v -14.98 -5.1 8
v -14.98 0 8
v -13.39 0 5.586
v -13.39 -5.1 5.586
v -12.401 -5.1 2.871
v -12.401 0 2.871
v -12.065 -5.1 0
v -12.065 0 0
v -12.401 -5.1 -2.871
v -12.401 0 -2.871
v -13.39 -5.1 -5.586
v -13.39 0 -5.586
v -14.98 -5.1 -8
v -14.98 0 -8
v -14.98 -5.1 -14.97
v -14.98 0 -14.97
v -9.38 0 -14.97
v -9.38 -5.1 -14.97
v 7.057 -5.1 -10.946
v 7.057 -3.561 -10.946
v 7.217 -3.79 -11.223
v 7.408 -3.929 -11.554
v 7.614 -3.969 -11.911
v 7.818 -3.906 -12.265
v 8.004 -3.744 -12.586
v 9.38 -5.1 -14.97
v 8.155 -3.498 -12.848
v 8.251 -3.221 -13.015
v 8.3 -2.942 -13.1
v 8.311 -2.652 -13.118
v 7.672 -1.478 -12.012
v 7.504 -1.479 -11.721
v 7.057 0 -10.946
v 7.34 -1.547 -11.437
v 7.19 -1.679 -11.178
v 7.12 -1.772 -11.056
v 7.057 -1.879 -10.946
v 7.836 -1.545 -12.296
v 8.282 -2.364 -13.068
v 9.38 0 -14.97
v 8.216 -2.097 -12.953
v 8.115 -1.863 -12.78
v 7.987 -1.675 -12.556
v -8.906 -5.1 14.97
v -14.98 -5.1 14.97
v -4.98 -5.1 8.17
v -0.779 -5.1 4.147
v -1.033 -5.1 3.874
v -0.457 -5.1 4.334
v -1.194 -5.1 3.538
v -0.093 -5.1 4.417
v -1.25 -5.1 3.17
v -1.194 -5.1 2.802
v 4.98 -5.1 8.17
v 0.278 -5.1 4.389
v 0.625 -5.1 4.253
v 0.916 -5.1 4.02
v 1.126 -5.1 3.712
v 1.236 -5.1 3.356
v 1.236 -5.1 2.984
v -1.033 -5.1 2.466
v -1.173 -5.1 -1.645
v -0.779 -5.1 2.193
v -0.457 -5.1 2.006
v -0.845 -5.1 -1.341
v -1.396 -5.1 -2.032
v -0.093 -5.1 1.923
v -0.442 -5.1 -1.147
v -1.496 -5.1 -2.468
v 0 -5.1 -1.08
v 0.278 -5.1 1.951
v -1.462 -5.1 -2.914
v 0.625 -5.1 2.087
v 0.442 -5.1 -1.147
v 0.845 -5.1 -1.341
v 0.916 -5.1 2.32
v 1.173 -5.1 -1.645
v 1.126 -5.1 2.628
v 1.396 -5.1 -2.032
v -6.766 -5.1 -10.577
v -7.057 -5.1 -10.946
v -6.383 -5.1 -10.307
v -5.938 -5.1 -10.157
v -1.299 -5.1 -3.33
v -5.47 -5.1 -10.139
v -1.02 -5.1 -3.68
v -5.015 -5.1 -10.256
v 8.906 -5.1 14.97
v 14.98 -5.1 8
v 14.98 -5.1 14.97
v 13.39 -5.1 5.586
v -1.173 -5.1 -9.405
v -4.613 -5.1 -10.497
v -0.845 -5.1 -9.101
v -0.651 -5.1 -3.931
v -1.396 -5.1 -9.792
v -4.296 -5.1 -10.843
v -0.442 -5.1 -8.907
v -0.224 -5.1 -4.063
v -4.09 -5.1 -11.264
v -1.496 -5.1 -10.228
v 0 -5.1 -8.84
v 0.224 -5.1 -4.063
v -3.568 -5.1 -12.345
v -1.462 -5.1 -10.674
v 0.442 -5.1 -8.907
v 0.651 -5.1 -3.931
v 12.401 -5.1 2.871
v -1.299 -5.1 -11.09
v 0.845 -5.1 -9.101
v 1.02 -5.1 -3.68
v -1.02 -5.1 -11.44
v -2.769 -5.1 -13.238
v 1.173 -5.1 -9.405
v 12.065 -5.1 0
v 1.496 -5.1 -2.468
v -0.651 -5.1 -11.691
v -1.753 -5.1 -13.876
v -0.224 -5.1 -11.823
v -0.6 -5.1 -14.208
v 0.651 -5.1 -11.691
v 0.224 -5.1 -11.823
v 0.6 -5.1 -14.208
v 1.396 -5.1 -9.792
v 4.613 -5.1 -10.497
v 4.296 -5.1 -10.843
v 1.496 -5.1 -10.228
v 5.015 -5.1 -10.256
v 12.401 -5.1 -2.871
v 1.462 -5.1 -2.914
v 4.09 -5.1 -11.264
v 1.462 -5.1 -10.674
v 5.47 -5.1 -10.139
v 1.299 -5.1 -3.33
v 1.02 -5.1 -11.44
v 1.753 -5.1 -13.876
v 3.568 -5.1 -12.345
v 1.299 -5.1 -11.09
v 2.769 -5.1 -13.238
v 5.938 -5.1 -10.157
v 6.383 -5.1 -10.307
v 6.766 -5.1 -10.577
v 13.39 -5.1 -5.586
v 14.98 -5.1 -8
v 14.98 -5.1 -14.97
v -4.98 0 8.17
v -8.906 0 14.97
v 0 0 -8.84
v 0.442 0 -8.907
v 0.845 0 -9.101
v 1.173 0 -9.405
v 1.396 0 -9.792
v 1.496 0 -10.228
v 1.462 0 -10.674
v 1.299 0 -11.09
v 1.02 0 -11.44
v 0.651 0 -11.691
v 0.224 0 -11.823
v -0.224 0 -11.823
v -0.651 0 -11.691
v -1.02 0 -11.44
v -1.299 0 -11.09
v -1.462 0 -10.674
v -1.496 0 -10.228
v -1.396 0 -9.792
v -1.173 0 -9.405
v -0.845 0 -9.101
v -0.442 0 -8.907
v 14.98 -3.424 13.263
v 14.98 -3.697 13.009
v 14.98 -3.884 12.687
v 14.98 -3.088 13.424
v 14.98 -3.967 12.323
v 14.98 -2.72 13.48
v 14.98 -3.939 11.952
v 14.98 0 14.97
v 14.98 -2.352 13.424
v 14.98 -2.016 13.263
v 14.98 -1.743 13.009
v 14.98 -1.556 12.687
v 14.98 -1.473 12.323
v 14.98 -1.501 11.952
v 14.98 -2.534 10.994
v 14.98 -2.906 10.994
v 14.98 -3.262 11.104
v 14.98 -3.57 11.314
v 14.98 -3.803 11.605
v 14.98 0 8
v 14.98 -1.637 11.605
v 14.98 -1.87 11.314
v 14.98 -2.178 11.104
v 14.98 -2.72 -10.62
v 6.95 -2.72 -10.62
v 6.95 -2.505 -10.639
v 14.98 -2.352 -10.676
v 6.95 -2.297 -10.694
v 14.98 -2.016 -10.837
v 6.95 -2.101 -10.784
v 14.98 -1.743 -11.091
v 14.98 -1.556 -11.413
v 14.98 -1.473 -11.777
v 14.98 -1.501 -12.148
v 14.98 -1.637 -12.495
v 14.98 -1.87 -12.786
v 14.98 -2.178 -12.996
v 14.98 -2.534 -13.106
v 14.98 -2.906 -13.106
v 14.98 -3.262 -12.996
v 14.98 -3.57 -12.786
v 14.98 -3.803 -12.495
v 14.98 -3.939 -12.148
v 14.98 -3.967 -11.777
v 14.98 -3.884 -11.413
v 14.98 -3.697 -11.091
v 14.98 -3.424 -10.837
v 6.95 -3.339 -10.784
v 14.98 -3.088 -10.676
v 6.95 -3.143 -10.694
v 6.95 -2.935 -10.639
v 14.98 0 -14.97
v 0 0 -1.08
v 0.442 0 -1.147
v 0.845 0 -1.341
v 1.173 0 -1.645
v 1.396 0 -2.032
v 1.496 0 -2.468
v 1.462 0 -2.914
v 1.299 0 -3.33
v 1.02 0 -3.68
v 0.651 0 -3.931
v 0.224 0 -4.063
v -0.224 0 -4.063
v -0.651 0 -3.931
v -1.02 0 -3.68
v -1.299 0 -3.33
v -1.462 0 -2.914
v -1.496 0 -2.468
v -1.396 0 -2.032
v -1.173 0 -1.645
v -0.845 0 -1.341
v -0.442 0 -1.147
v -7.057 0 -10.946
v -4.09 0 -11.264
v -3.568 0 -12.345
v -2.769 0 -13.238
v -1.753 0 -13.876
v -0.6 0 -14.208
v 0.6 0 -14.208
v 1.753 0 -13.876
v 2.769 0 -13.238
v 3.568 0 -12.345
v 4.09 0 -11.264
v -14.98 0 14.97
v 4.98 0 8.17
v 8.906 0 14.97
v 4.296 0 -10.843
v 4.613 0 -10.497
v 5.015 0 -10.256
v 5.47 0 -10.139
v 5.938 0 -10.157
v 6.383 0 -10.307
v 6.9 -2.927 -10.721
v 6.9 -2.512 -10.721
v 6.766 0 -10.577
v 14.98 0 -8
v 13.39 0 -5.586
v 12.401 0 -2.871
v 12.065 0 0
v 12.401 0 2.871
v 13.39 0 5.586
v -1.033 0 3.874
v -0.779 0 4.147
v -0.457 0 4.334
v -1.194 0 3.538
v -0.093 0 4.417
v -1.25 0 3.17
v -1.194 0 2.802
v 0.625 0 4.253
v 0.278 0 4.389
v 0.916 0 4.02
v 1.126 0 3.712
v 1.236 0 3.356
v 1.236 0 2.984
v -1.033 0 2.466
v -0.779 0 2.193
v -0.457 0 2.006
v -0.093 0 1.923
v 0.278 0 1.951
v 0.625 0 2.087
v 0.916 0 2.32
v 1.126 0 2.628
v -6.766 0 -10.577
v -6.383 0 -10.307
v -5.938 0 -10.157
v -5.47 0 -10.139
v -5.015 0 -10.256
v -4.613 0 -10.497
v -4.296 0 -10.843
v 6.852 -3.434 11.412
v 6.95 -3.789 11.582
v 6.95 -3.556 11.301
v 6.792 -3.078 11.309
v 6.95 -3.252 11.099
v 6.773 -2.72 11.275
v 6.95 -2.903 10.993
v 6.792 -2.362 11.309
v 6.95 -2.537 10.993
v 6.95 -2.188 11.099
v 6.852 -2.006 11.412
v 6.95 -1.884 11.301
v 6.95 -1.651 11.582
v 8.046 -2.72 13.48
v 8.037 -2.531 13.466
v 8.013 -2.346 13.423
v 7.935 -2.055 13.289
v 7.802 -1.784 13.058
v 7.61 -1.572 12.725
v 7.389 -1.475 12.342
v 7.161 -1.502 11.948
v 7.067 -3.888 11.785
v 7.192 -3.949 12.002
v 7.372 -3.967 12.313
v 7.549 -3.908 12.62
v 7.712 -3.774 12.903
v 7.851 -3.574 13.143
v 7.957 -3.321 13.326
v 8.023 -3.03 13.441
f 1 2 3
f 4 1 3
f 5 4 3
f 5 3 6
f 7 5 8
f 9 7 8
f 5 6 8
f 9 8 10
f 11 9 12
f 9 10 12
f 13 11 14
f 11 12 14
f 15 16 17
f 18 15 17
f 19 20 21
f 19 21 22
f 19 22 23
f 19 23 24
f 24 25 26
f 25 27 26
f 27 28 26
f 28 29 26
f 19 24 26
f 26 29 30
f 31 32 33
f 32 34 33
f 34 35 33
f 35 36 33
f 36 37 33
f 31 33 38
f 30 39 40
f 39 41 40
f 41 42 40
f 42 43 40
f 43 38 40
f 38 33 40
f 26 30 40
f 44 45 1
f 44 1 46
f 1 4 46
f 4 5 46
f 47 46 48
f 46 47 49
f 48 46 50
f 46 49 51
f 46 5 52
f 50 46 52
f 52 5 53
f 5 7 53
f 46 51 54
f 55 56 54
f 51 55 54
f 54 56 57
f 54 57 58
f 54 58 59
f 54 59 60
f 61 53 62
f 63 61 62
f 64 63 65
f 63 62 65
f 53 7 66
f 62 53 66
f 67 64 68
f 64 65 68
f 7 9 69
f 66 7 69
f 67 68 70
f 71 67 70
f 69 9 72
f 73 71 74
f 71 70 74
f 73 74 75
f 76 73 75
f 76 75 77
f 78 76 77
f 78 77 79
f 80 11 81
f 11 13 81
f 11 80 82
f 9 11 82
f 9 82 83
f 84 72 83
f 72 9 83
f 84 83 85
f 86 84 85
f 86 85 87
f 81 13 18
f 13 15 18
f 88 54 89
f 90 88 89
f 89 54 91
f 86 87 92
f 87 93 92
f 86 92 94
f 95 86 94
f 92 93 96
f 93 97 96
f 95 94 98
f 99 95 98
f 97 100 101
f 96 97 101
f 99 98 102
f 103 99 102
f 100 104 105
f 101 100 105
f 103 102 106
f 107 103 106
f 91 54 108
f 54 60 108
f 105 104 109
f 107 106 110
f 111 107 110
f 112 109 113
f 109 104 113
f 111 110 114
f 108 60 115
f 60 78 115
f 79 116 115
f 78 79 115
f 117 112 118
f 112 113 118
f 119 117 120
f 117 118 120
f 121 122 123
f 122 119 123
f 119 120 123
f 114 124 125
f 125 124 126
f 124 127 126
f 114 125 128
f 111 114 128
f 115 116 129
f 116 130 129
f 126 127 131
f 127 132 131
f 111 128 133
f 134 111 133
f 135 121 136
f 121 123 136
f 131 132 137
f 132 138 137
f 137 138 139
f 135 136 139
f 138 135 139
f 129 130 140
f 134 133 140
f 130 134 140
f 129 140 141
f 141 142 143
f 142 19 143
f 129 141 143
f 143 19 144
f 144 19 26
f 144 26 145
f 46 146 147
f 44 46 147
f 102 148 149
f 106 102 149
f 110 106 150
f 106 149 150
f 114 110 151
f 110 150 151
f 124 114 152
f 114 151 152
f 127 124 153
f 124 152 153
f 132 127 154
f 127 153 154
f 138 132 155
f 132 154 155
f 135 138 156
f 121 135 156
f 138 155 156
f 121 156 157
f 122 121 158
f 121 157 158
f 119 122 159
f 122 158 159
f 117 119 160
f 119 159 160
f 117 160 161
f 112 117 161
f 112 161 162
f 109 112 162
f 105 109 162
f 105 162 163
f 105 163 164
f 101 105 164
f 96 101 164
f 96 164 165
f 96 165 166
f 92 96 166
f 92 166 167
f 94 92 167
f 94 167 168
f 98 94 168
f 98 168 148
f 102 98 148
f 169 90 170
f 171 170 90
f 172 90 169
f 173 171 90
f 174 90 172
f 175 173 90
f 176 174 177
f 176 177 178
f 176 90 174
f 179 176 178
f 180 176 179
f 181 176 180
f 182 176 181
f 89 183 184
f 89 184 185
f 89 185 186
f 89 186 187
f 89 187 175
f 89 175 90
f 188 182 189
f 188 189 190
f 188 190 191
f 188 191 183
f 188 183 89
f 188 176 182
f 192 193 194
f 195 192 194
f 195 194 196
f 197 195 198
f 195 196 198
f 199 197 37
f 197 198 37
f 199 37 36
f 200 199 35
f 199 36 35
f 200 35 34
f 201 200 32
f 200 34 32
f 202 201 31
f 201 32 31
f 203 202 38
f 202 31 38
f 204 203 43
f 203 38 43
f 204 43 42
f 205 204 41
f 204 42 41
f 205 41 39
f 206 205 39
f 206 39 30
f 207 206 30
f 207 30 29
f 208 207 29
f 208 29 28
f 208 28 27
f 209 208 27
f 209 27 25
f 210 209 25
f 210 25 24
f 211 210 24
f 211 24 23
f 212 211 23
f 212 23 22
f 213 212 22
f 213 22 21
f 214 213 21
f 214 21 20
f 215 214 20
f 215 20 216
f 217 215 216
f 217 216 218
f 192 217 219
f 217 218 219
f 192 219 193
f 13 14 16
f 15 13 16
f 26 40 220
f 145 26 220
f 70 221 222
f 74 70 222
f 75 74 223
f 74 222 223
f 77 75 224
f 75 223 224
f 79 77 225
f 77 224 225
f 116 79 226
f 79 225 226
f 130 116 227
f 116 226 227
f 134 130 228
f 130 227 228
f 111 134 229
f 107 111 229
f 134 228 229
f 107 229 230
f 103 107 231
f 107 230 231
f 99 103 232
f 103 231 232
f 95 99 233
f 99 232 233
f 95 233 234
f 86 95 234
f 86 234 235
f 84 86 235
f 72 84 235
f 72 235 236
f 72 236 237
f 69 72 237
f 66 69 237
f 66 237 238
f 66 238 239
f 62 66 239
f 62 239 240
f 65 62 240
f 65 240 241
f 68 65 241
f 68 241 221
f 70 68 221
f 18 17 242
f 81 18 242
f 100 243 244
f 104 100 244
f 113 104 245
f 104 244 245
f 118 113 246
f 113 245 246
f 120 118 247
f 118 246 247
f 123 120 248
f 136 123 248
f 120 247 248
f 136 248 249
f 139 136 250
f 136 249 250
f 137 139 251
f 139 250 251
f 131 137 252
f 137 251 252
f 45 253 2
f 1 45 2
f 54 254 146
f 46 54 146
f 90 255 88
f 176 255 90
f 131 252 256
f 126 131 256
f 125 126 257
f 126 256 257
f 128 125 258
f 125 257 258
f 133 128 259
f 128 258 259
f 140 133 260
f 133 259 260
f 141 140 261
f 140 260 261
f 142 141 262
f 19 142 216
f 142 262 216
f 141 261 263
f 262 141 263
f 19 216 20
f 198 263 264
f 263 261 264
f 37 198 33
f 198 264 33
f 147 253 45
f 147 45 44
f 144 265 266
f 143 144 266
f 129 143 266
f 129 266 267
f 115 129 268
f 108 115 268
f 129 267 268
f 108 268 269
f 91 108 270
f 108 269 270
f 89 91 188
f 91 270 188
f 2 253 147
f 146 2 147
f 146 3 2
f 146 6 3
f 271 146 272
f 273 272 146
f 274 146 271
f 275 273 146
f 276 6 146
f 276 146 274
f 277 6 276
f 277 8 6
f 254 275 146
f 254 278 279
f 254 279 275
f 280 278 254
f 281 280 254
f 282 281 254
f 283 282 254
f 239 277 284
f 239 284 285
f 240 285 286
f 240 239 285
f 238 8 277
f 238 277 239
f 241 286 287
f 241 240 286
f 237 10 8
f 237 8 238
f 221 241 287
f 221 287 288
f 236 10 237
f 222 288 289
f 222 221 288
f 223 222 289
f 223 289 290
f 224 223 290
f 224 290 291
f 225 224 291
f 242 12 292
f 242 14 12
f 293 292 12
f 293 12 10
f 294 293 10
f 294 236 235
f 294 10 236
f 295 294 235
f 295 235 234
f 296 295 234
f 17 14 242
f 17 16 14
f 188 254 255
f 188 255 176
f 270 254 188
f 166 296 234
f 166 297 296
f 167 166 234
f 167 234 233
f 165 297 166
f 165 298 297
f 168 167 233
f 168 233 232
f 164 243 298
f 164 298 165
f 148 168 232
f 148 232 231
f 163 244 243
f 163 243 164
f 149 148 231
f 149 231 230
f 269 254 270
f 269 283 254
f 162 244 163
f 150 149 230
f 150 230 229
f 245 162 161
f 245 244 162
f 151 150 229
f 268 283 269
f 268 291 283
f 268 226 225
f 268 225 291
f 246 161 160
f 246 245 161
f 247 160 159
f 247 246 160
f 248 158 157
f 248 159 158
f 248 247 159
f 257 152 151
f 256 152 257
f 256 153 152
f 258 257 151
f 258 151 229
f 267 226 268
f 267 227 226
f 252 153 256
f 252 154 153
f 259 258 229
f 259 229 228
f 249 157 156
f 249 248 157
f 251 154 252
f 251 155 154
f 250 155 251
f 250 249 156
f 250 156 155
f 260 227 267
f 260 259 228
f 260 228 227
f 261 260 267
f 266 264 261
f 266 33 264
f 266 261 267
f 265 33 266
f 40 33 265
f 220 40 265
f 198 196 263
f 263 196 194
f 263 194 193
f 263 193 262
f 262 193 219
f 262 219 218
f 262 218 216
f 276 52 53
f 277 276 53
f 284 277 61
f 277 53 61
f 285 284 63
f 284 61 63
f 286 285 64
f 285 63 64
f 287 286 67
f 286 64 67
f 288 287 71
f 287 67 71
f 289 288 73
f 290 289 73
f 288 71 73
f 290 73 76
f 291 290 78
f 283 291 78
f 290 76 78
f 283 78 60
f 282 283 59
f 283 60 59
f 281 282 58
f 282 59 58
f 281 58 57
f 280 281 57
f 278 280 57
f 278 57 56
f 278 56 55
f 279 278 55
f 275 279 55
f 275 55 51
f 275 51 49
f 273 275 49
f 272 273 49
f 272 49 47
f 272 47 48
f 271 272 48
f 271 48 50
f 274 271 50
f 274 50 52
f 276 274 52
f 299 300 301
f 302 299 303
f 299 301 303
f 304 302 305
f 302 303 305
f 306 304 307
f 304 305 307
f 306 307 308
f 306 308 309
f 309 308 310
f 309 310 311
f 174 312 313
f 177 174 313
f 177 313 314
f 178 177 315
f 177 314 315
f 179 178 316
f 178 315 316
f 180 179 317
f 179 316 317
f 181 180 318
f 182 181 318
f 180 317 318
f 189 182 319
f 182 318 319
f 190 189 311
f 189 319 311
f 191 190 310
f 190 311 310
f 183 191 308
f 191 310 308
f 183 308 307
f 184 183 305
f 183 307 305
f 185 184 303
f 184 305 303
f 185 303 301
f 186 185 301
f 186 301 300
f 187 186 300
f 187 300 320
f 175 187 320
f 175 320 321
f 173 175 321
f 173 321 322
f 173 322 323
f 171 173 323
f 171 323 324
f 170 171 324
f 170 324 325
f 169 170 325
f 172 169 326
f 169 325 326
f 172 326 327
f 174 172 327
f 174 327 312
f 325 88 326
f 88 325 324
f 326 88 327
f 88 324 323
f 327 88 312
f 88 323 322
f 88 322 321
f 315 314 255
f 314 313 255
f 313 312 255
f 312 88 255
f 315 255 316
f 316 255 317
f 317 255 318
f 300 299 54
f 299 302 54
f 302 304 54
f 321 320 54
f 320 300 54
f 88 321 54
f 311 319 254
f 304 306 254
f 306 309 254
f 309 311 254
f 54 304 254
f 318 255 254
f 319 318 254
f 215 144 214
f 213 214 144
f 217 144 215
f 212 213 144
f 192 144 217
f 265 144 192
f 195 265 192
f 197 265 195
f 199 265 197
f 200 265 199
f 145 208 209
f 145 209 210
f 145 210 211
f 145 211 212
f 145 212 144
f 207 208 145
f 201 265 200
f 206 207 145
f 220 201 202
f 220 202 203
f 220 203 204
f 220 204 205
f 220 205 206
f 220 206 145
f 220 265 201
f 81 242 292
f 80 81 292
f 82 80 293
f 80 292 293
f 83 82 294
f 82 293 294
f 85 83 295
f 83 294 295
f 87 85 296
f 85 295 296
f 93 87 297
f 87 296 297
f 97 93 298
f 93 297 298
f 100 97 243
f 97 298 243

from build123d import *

# Parameters (mm, degrees)
SCHIZZO1_W                    = 29.96
SCHIZZO1_H                    = 29.94
ESTRUSIONE_ESTRUSIONE1_DEPTH  = 5.1
TAGLIO_ESTRUSIONE1_DEPTH      = 5.1
SCHIZZO3_R                    = 1.5
TAGLIO_ESTRUSIONE2_DEPTH      = 22.783280286
FORO_FILETTATO_M3X0_5_1_D     = 2.5
FORO_FILETTATO_M3X0_5_2_D     = 2.5
FORO_FILETTATO_M3X0_5_2_DEPTH = 10
FORO_FILETTATO_M3X0_5_2_TIP   = 0.751075774


with BuildPart() as part:
    # Schizzo1 → Estrusione-Estrusione1 (new body)
    with BuildSketch(Plane(origin=(0, 0, 0), x_dir=(1, 0, 0), z_dir=(0, 1, 0))):
        Rectangle(SCHIZZO1_W, SCHIZZO1_H)
    extrude(amount=-ESTRUSIONE_ESTRUSIONE1_DEPTH)

    # Schizzo2 → Taglio-Estrusione1 (cut)
    with BuildSketch(Plane(origin=(0, 0, 0), x_dir=(1, 0, 0), z_dir=(0, 1, 0))):
        Polygon((-4.98, -8.17), (-8.90598183, -14.97), (8.90598183, -14.97), (4.98, -8.17), align=None)
        with BuildLine():
            ThreePointArc((14.98, 8), (12.065, 0), (14.98, -8))
            Line((14.98, -8), (14.98, 8))
        make_face()
        with BuildLine():
            Line((9.38, 14.97), (-9.38, 14.97))
            Line((-9.38, 14.97), (-7.05655311, 10.945671938))
            ThreePointArc((-7.05655311, 10.945671938), (-5.469571784, 10.139327056), (-4.09, 11.264264161))
            ThreePointArc((-4.09, 11.264264161), (0, 14.25), (4.09, 11.264264161))
            ThreePointArc((4.09, 11.264264161), (5.469571784, 10.139327056), (7.05655311, 10.945671938))
            Line((7.05655311, 10.945671938), (9.38, 14.97))
        make_face()
        with BuildLine():
            Line((-14.98, 8), (-14.98, -8))
            ThreePointArc((-14.98, -8), (-12.065, 0), (-14.98, 8))
        make_face()
    extrude(amount=-TAGLIO_ESTRUSIONE1_DEPTH, mode=Mode.SUBTRACT)

    # Schizzo3 → Taglio-Estrusione2 (cut, through all)
    with BuildSketch(Plane(origin=(0, 0, 0), x_dir=(1, 0, 0), z_dir=(0, 1, 0))):
        with Locations(Location((0, 10.34, 0), (0, 0, 270))):
            Circle(SCHIZZO3_R)
        with Locations(Location((0, 2.58, 0), (0, 0, 270))):
            Circle(SCHIZZO3_R)
    extrude(amount=-TAGLIO_ESTRUSIONE2_DEPTH, mode=Mode.SUBTRACT)

    # Foro filettato M3x0.5-1 (through all)
    with Locations(Plane(origin=(0, 0, 0), x_dir=(1, 0, 0), z_dir=(0, 1, 0))):
        with Locations((0, -3.17)):
            Hole(FORO_FILETTATO_M3X0_5_1_D / 2)

    # Foro filettato M3x0.5-2
    with Locations(Plane(origin=(16.95, 0, 0), x_dir=(0, 0, -1), z_dir=(1, 0, 0))):
        with Locations((-12.23, -2.72), (11.87, -2.72)):
            Hole(FORO_FILETTATO_M3X0_5_2_D / 2, depth=FORO_FILETTATO_M3X0_5_2_DEPTH)
            with Locations((0, 0, -(FORO_FILETTATO_M3X0_5_2_DEPTH + FORO_FILETTATO_M3X0_5_2_TIP / 2))):  # 118° drill point
                Cone(0, FORO_FILETTATO_M3X0_5_2_D / 2, FORO_FILETTATO_M3X0_5_2_TIP, mode=Mode.SUBTRACT)


solid = part.part
